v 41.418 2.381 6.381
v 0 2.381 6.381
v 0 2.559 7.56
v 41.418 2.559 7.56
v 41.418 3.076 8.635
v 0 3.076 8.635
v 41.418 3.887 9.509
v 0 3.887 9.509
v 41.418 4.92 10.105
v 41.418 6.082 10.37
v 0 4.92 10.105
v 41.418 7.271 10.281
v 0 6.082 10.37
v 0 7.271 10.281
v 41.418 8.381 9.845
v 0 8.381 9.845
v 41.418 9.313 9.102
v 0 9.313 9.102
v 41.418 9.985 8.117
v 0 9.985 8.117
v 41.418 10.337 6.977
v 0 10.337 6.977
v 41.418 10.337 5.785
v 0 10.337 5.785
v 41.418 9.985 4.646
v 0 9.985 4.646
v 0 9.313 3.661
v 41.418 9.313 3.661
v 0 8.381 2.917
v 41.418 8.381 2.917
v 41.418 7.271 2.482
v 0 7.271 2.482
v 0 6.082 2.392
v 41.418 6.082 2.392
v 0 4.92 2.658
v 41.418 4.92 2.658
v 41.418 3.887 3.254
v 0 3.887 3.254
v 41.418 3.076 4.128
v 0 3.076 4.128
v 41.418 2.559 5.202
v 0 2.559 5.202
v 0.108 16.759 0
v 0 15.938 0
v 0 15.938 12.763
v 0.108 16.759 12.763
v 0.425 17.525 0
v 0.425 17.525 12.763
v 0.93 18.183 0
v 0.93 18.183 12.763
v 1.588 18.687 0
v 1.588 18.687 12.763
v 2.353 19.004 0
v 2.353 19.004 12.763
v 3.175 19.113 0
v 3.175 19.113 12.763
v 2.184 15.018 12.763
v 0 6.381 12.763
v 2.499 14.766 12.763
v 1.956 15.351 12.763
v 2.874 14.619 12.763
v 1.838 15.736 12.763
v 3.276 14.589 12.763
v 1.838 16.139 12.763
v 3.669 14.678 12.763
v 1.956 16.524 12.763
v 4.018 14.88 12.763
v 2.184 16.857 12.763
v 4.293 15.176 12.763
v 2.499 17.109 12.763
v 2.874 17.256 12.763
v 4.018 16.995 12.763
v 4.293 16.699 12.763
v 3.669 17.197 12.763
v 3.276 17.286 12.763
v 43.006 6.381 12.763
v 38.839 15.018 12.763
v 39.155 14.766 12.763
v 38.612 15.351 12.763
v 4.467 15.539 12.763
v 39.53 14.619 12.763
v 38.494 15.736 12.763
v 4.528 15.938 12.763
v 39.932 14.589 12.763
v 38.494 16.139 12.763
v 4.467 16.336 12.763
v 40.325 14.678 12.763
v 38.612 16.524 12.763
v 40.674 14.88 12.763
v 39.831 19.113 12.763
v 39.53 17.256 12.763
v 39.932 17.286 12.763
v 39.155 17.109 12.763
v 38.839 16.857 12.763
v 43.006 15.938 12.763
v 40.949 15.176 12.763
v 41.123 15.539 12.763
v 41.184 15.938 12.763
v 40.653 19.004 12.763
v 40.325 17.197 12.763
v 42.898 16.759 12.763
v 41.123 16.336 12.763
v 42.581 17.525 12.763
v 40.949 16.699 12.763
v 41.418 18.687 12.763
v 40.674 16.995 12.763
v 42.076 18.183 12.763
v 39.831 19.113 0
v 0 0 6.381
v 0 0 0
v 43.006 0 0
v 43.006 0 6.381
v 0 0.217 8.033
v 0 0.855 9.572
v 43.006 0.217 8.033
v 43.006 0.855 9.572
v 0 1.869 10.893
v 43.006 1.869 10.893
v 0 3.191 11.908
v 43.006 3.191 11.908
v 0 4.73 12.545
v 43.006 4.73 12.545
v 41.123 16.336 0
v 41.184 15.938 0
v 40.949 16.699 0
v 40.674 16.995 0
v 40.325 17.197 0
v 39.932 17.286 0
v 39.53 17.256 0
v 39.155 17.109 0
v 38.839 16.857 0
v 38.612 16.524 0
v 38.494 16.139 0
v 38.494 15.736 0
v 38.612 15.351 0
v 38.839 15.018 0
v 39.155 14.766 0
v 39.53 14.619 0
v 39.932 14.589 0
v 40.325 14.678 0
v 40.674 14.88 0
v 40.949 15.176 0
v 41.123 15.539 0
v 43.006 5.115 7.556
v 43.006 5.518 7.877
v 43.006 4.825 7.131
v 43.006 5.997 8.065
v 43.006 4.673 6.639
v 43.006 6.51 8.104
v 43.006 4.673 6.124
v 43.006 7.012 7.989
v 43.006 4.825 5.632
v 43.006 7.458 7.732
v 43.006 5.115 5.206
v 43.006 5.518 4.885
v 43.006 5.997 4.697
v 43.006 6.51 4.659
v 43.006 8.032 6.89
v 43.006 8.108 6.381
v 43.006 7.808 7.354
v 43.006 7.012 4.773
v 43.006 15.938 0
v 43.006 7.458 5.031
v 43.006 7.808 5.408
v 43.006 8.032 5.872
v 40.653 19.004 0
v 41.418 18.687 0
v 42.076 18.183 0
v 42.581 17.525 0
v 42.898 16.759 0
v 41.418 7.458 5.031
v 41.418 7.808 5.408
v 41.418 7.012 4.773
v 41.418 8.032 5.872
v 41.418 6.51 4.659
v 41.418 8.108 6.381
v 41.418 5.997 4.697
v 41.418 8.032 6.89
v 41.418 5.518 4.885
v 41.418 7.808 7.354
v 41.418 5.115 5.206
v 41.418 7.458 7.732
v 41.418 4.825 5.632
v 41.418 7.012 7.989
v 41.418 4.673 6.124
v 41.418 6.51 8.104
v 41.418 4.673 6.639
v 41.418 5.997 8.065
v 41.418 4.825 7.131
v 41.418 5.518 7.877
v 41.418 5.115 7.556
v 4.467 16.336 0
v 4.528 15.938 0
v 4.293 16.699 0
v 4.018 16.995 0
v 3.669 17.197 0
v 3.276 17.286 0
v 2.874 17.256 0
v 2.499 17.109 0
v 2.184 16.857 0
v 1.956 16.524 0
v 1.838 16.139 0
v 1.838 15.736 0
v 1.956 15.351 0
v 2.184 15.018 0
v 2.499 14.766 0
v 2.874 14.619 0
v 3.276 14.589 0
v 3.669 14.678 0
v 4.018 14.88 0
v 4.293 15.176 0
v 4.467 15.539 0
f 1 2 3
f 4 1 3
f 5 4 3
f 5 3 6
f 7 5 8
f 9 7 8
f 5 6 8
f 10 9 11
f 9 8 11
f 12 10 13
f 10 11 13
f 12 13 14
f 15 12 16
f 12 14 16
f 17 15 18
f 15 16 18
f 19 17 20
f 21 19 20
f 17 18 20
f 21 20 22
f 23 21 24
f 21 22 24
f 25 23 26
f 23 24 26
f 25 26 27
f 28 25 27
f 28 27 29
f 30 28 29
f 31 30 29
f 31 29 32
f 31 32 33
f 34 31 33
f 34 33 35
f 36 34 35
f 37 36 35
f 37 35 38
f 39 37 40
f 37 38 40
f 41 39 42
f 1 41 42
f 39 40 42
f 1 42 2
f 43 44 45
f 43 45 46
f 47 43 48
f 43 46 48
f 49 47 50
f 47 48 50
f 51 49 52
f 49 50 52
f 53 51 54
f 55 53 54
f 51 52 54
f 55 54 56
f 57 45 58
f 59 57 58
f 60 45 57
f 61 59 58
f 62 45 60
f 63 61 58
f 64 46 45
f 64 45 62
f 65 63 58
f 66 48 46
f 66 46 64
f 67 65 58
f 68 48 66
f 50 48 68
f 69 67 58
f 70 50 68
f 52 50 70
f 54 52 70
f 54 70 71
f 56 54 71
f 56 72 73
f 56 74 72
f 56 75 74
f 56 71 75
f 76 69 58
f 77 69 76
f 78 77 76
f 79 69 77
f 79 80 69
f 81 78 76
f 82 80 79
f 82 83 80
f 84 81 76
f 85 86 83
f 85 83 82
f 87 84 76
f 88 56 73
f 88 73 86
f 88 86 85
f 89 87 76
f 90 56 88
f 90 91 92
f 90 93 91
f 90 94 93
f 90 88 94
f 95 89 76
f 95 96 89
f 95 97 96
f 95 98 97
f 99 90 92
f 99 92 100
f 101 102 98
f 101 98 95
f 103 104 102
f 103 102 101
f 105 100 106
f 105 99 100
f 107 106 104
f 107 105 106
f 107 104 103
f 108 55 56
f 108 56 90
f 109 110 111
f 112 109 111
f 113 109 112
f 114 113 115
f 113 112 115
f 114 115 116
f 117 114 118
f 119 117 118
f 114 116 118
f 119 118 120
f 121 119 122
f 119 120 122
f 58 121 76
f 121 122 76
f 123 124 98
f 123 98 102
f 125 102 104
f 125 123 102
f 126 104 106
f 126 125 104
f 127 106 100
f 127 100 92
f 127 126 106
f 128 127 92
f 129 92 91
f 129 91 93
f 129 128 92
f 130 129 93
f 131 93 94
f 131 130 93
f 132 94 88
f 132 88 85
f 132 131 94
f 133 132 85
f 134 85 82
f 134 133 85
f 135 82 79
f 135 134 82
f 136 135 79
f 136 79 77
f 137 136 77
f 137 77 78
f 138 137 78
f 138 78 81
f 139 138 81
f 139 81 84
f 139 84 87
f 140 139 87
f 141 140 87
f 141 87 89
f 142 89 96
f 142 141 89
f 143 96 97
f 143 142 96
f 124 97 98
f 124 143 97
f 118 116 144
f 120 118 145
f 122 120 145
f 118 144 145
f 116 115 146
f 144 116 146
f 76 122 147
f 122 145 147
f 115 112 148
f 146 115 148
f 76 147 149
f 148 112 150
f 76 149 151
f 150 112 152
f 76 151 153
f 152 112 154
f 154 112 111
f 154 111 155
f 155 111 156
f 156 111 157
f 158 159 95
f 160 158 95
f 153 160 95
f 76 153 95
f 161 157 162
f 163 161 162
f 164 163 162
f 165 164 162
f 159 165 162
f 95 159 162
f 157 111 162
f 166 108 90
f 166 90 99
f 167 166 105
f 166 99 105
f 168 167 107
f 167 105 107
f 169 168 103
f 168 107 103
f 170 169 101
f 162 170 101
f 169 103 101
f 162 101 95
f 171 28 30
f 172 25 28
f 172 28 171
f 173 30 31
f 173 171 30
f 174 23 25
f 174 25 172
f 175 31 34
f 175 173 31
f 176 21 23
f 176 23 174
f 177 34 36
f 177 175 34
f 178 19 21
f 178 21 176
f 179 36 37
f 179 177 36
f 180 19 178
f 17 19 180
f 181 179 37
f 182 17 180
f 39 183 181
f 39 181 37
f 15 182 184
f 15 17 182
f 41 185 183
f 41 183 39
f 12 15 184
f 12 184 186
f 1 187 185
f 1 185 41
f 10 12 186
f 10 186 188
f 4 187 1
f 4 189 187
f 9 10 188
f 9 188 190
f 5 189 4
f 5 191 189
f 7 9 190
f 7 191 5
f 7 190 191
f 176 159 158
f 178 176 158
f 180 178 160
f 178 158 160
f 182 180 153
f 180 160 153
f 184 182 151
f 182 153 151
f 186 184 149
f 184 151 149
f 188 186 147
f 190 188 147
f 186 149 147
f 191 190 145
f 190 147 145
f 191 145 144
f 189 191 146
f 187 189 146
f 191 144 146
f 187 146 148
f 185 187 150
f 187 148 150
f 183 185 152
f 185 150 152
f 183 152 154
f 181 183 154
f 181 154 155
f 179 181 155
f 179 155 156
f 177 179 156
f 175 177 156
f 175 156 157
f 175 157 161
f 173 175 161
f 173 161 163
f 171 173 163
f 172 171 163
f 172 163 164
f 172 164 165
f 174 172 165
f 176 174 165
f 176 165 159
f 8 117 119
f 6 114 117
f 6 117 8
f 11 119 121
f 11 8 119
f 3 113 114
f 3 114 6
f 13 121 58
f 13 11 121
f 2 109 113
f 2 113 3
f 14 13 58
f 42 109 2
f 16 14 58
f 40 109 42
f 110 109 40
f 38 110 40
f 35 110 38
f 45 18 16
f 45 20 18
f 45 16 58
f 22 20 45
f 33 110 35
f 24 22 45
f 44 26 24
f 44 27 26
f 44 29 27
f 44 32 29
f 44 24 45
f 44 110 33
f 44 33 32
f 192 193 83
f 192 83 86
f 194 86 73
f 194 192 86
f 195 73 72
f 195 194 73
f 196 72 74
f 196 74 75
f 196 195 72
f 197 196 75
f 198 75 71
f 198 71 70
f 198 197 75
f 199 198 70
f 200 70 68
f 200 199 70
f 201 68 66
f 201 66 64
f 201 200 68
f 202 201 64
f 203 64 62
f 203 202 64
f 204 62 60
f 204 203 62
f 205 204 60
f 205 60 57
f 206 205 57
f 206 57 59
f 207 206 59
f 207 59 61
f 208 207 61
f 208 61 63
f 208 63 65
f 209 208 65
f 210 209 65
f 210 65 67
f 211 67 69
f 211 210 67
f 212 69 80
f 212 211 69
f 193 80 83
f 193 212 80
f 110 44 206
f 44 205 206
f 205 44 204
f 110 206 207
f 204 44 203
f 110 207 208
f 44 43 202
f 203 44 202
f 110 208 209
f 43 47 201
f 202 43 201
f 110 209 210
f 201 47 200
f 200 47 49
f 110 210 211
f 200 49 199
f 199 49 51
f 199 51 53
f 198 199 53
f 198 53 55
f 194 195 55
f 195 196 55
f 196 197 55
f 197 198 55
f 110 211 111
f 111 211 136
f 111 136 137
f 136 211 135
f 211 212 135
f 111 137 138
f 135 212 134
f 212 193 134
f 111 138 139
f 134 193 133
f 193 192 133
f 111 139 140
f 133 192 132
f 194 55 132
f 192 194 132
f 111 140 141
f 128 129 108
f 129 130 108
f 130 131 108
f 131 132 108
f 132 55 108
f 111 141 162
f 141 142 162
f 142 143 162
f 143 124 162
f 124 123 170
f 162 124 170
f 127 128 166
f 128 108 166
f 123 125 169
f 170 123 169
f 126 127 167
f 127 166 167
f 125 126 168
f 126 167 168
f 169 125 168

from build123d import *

# Parameters (mm, degrees)
F0_W     = 43.0059846
F0_H     = 19.1125094
F0_R     = 1.35255
F1_DEPTH = 12.7625094
F2_R     = 3.175
F3_R     = 6.3812547
F4_R     = 1.7272
F5_DEPTH = 43.0059846
F6_R     = 4
F6_R_2   = 1.7272
F8_DEPTH = 41.4184846


with BuildPart() as f1:
    # F0 (on Top) → F1 (new body)
    with BuildSketch(Plane.XY):
        with Locations((21.5029923, 9.5562547)):
            Rectangle(F0_W, F0_H)
        with Locations((3.175, 15.9375094)):
            Circle(F0_R, mode=Mode.SUBTRACT)
        with Locations((39.8309846, 15.9375094)):
            Circle(F0_R, mode=Mode.SUBTRACT)
    extrude(amount=F1_DEPTH)

    # F2
    f2_edges = [f1.edges().sort_by_distance(p)[0] for p in [
        (43.005985, 19.112509, 6.381255),
        (0, 19.112509, 6.381255),
    ]]
    fillet(f2_edges, radius=F2_R)

    # F3
    f3_edges = [f1.edges().sort_by_distance(p)[0] for p in [
        (21.502992, 0, 12.762509),
    ]]
    fillet(f3_edges, radius=F3_R)

    # F4 (on face) → F5 (cut, through all)
    with BuildSketch(Plane.YZ.offset(43.0059846)):
        with Locations((6.3812547, 6.3812547)):
            Circle(F4_R)
    extrude(amount=-F5_DEPTH, mode=Mode.SUBTRACT)

    # F6 (on face) → F8 (cut, through all)
    with BuildSketch(Plane(origin=(0, 0, 0), x_dir=(0, -1, 0), z_dir=(-1, 0, 0))):
        with Locations((-6.3812547, 6.3812547)):
            Circle(F6_R)
        with Locations((-6.3812547, 6.3812547)):
            Circle(F6_R_2, mode=Mode.SUBTRACT)
    extrude(amount=-F8_DEPTH, mode=Mode.SUBTRACT)


solid = f1.part
